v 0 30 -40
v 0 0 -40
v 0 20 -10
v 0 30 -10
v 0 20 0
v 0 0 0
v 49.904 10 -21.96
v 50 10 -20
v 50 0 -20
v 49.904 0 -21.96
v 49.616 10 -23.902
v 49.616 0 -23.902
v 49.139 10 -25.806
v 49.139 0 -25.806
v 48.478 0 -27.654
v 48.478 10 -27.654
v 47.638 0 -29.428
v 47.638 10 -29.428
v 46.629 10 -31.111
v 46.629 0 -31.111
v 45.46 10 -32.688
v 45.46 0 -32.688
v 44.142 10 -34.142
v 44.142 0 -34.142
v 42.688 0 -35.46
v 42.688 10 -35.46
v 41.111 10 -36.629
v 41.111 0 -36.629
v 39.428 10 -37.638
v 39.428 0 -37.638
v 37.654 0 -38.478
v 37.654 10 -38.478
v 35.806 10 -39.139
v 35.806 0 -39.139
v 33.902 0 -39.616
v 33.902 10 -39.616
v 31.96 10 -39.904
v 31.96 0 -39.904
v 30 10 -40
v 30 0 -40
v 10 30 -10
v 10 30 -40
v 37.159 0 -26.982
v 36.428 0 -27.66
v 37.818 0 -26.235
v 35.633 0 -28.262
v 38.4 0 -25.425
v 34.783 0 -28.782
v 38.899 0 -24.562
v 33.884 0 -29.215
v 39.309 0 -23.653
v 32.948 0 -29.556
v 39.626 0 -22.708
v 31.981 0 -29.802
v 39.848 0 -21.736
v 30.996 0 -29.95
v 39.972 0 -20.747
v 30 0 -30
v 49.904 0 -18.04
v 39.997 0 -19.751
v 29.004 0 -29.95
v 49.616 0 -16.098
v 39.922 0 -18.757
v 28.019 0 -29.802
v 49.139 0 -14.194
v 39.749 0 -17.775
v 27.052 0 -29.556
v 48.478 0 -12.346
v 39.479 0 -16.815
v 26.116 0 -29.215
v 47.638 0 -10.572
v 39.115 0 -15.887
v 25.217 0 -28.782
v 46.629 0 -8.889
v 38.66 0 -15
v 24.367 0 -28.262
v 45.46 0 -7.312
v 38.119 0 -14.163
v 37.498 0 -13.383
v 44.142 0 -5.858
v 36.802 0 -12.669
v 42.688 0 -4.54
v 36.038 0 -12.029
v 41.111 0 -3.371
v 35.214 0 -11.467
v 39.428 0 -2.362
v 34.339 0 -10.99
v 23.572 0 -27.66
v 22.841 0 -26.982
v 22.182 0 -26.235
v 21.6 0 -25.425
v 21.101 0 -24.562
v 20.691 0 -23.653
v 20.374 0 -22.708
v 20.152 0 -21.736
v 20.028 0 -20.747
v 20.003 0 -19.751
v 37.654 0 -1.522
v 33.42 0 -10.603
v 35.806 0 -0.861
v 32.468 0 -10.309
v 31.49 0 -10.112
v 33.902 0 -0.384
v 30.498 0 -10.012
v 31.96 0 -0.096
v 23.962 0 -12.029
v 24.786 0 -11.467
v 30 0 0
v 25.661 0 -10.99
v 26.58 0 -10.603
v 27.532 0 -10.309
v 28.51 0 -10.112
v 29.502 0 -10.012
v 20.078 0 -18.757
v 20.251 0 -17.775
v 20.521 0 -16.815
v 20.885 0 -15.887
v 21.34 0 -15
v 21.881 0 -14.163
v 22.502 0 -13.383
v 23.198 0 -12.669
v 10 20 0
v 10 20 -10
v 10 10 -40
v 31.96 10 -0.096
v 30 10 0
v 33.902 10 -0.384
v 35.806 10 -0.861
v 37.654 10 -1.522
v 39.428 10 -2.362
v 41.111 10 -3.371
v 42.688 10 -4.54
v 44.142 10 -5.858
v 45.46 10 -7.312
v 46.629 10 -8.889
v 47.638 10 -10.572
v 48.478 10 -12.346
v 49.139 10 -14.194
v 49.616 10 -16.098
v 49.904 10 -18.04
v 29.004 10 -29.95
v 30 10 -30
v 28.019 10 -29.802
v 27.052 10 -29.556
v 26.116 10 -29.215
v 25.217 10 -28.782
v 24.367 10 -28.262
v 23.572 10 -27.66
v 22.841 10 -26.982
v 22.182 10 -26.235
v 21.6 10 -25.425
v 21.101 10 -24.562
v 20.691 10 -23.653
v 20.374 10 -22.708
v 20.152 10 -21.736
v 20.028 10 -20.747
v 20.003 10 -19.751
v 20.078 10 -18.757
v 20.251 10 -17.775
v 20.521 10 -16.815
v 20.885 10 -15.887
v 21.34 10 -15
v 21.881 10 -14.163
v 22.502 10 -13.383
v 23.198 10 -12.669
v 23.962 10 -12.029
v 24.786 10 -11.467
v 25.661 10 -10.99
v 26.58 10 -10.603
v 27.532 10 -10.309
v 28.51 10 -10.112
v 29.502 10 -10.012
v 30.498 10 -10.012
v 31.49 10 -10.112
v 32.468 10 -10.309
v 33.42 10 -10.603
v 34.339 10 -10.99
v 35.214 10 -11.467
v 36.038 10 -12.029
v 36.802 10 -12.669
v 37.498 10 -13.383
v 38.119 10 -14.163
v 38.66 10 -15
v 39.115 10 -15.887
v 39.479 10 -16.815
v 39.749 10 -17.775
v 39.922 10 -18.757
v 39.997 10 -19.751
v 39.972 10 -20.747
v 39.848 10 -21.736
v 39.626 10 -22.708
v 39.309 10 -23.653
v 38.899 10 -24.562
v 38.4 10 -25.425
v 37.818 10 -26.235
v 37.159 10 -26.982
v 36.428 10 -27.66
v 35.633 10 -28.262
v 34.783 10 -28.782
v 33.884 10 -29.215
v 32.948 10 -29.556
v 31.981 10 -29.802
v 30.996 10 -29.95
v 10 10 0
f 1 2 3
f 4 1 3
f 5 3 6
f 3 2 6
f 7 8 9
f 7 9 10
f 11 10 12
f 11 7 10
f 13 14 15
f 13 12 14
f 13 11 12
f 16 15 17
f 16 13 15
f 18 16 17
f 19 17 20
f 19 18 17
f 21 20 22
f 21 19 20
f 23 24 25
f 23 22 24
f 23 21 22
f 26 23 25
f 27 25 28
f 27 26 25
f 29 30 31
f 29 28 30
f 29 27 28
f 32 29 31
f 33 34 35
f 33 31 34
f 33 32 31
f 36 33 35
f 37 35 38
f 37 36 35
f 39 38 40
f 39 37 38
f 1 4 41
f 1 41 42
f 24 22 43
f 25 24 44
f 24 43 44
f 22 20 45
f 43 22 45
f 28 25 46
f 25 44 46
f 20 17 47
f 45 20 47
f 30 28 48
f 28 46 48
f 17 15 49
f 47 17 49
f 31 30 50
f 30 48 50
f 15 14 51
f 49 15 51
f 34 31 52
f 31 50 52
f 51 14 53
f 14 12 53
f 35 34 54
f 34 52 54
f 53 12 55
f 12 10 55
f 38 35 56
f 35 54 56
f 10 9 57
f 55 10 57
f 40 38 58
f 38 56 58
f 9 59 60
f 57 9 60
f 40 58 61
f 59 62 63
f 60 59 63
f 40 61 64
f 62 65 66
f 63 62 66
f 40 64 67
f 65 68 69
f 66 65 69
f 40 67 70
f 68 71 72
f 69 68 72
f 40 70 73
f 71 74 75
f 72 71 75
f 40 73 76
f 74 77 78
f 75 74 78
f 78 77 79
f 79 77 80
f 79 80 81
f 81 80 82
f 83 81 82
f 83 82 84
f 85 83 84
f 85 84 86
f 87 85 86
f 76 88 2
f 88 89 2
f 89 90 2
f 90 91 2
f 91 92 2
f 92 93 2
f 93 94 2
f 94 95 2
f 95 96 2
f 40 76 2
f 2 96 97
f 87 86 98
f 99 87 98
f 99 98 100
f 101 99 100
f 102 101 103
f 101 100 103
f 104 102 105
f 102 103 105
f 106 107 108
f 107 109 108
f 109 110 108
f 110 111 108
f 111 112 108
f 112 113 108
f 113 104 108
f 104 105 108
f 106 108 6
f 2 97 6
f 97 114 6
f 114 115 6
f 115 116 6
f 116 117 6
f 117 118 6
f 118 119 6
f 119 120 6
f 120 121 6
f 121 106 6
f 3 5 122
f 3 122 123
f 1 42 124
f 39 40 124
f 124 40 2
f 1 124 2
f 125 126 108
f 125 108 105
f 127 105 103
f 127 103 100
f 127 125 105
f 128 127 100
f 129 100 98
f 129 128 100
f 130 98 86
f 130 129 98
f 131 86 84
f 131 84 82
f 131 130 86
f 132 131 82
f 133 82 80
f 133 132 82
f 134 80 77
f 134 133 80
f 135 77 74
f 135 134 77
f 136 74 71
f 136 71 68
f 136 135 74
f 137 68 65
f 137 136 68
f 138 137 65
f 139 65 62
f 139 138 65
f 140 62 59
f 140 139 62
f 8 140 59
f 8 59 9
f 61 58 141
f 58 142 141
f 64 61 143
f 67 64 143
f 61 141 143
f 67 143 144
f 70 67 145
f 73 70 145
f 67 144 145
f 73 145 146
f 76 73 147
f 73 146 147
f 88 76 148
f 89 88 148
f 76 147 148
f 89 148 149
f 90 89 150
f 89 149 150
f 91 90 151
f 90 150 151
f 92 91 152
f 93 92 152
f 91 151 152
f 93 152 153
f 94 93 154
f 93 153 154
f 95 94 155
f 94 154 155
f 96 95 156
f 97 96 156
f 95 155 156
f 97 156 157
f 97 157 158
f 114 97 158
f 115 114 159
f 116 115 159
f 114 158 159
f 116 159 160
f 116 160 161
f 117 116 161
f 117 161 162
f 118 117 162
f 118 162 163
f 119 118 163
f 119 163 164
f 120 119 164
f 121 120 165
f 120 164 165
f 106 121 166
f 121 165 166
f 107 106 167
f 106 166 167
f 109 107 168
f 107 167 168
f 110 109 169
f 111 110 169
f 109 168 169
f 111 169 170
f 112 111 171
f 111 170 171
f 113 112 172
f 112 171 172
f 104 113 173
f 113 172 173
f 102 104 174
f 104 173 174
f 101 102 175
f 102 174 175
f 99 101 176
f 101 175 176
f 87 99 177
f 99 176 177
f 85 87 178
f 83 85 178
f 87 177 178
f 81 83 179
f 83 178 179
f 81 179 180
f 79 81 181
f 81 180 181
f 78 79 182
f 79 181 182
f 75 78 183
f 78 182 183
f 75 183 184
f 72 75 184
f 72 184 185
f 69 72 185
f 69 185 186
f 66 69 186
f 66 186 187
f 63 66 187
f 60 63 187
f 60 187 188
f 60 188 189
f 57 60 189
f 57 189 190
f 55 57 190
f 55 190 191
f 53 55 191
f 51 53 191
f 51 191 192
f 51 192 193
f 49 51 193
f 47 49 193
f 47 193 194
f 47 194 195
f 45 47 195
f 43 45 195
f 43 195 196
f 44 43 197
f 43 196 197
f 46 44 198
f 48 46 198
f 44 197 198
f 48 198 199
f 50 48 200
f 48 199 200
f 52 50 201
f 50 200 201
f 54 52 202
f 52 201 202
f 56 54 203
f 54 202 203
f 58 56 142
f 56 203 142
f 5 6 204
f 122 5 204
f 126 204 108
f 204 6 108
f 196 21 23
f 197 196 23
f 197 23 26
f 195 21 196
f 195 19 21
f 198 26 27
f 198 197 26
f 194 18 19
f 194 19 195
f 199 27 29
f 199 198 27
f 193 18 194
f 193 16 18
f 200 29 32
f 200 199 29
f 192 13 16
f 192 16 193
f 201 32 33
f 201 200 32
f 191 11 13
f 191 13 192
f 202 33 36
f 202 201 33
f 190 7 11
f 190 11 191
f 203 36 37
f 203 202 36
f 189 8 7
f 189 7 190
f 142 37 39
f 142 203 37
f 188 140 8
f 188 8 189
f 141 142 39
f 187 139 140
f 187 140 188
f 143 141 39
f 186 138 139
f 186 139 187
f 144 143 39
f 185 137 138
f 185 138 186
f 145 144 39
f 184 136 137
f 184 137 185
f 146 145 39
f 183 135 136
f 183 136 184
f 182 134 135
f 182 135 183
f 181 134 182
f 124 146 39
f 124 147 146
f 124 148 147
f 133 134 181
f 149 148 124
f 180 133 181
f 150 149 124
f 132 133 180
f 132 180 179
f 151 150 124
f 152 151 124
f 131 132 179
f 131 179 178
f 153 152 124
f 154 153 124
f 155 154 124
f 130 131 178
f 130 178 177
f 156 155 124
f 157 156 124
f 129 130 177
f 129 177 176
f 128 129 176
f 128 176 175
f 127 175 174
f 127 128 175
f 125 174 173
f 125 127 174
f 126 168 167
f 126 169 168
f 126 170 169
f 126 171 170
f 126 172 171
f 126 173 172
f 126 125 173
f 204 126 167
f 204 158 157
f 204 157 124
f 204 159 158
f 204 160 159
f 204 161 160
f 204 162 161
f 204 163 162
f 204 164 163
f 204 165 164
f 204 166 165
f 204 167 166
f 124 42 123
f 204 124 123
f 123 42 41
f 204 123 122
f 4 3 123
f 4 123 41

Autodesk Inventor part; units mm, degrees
ref_plane "YZ Plane" through (0, 0, 0) normal (1, 0, 0) x (0, 1, 0)
ref_plane "XZ Plane" through (0, 0, 0) normal (0, 1, 0) x (-1, 0, 0)
ref_plane "XY Plane" through (0, 0, 0) normal (0, 0, 1) x (1, 0, 0)
sketch "草圖1" plane through (0, 0, 0) normal (0, 1, 0) x (-1, 0, 0)
  line L0 (0, 0) -> (-50, 0)
  line L1 (-50, 0) -> (-50, -40)
  line L2 (-50, -40) -> (0, -40)
  line L3 (0, -40) -> (0, 0)
  dimension "d0" = 50
  dimension "d1" = 40
extrude "擠出1" add sketch "草圖1" along normal blind 10
sketch "草圖2" plane through (0, 0, -40) normal (-1, 0, 0) x (0, 0, 1)
  line L0 (0, 0) -> (0, 10) projected
  line L1 (0, 10) -> (40, 10)
  line L2 (40, 10) -> (40, 20)
  line L3 (40, 20) -> (0, 20)
  line L4 (0, 20) -> (0, 10)
  line L5 (0, 20) -> (30, 20)
  line L6 (30, 20) -> (30, 30)
  line L7 (30, 30) -> (0, 30)
  line L8 (0, 30) -> (0, 20)
  point P0 (40, 0)
  dimension "d4" = 30
  dimension "d5" = 40
  dimension "d6" = 10
  dimension "d7" = 10
extrude "擠出2" add sketch "草圖2" against normal blind 10
fillet "圓角1" radius 20 2 edges at (50, 5, 0) (50, 5, -40)
hole "孔1" at (30, 0, -20) direction (0, 1, 0) diameter 20 depth 10 tip angle 118
properties part number "35"
